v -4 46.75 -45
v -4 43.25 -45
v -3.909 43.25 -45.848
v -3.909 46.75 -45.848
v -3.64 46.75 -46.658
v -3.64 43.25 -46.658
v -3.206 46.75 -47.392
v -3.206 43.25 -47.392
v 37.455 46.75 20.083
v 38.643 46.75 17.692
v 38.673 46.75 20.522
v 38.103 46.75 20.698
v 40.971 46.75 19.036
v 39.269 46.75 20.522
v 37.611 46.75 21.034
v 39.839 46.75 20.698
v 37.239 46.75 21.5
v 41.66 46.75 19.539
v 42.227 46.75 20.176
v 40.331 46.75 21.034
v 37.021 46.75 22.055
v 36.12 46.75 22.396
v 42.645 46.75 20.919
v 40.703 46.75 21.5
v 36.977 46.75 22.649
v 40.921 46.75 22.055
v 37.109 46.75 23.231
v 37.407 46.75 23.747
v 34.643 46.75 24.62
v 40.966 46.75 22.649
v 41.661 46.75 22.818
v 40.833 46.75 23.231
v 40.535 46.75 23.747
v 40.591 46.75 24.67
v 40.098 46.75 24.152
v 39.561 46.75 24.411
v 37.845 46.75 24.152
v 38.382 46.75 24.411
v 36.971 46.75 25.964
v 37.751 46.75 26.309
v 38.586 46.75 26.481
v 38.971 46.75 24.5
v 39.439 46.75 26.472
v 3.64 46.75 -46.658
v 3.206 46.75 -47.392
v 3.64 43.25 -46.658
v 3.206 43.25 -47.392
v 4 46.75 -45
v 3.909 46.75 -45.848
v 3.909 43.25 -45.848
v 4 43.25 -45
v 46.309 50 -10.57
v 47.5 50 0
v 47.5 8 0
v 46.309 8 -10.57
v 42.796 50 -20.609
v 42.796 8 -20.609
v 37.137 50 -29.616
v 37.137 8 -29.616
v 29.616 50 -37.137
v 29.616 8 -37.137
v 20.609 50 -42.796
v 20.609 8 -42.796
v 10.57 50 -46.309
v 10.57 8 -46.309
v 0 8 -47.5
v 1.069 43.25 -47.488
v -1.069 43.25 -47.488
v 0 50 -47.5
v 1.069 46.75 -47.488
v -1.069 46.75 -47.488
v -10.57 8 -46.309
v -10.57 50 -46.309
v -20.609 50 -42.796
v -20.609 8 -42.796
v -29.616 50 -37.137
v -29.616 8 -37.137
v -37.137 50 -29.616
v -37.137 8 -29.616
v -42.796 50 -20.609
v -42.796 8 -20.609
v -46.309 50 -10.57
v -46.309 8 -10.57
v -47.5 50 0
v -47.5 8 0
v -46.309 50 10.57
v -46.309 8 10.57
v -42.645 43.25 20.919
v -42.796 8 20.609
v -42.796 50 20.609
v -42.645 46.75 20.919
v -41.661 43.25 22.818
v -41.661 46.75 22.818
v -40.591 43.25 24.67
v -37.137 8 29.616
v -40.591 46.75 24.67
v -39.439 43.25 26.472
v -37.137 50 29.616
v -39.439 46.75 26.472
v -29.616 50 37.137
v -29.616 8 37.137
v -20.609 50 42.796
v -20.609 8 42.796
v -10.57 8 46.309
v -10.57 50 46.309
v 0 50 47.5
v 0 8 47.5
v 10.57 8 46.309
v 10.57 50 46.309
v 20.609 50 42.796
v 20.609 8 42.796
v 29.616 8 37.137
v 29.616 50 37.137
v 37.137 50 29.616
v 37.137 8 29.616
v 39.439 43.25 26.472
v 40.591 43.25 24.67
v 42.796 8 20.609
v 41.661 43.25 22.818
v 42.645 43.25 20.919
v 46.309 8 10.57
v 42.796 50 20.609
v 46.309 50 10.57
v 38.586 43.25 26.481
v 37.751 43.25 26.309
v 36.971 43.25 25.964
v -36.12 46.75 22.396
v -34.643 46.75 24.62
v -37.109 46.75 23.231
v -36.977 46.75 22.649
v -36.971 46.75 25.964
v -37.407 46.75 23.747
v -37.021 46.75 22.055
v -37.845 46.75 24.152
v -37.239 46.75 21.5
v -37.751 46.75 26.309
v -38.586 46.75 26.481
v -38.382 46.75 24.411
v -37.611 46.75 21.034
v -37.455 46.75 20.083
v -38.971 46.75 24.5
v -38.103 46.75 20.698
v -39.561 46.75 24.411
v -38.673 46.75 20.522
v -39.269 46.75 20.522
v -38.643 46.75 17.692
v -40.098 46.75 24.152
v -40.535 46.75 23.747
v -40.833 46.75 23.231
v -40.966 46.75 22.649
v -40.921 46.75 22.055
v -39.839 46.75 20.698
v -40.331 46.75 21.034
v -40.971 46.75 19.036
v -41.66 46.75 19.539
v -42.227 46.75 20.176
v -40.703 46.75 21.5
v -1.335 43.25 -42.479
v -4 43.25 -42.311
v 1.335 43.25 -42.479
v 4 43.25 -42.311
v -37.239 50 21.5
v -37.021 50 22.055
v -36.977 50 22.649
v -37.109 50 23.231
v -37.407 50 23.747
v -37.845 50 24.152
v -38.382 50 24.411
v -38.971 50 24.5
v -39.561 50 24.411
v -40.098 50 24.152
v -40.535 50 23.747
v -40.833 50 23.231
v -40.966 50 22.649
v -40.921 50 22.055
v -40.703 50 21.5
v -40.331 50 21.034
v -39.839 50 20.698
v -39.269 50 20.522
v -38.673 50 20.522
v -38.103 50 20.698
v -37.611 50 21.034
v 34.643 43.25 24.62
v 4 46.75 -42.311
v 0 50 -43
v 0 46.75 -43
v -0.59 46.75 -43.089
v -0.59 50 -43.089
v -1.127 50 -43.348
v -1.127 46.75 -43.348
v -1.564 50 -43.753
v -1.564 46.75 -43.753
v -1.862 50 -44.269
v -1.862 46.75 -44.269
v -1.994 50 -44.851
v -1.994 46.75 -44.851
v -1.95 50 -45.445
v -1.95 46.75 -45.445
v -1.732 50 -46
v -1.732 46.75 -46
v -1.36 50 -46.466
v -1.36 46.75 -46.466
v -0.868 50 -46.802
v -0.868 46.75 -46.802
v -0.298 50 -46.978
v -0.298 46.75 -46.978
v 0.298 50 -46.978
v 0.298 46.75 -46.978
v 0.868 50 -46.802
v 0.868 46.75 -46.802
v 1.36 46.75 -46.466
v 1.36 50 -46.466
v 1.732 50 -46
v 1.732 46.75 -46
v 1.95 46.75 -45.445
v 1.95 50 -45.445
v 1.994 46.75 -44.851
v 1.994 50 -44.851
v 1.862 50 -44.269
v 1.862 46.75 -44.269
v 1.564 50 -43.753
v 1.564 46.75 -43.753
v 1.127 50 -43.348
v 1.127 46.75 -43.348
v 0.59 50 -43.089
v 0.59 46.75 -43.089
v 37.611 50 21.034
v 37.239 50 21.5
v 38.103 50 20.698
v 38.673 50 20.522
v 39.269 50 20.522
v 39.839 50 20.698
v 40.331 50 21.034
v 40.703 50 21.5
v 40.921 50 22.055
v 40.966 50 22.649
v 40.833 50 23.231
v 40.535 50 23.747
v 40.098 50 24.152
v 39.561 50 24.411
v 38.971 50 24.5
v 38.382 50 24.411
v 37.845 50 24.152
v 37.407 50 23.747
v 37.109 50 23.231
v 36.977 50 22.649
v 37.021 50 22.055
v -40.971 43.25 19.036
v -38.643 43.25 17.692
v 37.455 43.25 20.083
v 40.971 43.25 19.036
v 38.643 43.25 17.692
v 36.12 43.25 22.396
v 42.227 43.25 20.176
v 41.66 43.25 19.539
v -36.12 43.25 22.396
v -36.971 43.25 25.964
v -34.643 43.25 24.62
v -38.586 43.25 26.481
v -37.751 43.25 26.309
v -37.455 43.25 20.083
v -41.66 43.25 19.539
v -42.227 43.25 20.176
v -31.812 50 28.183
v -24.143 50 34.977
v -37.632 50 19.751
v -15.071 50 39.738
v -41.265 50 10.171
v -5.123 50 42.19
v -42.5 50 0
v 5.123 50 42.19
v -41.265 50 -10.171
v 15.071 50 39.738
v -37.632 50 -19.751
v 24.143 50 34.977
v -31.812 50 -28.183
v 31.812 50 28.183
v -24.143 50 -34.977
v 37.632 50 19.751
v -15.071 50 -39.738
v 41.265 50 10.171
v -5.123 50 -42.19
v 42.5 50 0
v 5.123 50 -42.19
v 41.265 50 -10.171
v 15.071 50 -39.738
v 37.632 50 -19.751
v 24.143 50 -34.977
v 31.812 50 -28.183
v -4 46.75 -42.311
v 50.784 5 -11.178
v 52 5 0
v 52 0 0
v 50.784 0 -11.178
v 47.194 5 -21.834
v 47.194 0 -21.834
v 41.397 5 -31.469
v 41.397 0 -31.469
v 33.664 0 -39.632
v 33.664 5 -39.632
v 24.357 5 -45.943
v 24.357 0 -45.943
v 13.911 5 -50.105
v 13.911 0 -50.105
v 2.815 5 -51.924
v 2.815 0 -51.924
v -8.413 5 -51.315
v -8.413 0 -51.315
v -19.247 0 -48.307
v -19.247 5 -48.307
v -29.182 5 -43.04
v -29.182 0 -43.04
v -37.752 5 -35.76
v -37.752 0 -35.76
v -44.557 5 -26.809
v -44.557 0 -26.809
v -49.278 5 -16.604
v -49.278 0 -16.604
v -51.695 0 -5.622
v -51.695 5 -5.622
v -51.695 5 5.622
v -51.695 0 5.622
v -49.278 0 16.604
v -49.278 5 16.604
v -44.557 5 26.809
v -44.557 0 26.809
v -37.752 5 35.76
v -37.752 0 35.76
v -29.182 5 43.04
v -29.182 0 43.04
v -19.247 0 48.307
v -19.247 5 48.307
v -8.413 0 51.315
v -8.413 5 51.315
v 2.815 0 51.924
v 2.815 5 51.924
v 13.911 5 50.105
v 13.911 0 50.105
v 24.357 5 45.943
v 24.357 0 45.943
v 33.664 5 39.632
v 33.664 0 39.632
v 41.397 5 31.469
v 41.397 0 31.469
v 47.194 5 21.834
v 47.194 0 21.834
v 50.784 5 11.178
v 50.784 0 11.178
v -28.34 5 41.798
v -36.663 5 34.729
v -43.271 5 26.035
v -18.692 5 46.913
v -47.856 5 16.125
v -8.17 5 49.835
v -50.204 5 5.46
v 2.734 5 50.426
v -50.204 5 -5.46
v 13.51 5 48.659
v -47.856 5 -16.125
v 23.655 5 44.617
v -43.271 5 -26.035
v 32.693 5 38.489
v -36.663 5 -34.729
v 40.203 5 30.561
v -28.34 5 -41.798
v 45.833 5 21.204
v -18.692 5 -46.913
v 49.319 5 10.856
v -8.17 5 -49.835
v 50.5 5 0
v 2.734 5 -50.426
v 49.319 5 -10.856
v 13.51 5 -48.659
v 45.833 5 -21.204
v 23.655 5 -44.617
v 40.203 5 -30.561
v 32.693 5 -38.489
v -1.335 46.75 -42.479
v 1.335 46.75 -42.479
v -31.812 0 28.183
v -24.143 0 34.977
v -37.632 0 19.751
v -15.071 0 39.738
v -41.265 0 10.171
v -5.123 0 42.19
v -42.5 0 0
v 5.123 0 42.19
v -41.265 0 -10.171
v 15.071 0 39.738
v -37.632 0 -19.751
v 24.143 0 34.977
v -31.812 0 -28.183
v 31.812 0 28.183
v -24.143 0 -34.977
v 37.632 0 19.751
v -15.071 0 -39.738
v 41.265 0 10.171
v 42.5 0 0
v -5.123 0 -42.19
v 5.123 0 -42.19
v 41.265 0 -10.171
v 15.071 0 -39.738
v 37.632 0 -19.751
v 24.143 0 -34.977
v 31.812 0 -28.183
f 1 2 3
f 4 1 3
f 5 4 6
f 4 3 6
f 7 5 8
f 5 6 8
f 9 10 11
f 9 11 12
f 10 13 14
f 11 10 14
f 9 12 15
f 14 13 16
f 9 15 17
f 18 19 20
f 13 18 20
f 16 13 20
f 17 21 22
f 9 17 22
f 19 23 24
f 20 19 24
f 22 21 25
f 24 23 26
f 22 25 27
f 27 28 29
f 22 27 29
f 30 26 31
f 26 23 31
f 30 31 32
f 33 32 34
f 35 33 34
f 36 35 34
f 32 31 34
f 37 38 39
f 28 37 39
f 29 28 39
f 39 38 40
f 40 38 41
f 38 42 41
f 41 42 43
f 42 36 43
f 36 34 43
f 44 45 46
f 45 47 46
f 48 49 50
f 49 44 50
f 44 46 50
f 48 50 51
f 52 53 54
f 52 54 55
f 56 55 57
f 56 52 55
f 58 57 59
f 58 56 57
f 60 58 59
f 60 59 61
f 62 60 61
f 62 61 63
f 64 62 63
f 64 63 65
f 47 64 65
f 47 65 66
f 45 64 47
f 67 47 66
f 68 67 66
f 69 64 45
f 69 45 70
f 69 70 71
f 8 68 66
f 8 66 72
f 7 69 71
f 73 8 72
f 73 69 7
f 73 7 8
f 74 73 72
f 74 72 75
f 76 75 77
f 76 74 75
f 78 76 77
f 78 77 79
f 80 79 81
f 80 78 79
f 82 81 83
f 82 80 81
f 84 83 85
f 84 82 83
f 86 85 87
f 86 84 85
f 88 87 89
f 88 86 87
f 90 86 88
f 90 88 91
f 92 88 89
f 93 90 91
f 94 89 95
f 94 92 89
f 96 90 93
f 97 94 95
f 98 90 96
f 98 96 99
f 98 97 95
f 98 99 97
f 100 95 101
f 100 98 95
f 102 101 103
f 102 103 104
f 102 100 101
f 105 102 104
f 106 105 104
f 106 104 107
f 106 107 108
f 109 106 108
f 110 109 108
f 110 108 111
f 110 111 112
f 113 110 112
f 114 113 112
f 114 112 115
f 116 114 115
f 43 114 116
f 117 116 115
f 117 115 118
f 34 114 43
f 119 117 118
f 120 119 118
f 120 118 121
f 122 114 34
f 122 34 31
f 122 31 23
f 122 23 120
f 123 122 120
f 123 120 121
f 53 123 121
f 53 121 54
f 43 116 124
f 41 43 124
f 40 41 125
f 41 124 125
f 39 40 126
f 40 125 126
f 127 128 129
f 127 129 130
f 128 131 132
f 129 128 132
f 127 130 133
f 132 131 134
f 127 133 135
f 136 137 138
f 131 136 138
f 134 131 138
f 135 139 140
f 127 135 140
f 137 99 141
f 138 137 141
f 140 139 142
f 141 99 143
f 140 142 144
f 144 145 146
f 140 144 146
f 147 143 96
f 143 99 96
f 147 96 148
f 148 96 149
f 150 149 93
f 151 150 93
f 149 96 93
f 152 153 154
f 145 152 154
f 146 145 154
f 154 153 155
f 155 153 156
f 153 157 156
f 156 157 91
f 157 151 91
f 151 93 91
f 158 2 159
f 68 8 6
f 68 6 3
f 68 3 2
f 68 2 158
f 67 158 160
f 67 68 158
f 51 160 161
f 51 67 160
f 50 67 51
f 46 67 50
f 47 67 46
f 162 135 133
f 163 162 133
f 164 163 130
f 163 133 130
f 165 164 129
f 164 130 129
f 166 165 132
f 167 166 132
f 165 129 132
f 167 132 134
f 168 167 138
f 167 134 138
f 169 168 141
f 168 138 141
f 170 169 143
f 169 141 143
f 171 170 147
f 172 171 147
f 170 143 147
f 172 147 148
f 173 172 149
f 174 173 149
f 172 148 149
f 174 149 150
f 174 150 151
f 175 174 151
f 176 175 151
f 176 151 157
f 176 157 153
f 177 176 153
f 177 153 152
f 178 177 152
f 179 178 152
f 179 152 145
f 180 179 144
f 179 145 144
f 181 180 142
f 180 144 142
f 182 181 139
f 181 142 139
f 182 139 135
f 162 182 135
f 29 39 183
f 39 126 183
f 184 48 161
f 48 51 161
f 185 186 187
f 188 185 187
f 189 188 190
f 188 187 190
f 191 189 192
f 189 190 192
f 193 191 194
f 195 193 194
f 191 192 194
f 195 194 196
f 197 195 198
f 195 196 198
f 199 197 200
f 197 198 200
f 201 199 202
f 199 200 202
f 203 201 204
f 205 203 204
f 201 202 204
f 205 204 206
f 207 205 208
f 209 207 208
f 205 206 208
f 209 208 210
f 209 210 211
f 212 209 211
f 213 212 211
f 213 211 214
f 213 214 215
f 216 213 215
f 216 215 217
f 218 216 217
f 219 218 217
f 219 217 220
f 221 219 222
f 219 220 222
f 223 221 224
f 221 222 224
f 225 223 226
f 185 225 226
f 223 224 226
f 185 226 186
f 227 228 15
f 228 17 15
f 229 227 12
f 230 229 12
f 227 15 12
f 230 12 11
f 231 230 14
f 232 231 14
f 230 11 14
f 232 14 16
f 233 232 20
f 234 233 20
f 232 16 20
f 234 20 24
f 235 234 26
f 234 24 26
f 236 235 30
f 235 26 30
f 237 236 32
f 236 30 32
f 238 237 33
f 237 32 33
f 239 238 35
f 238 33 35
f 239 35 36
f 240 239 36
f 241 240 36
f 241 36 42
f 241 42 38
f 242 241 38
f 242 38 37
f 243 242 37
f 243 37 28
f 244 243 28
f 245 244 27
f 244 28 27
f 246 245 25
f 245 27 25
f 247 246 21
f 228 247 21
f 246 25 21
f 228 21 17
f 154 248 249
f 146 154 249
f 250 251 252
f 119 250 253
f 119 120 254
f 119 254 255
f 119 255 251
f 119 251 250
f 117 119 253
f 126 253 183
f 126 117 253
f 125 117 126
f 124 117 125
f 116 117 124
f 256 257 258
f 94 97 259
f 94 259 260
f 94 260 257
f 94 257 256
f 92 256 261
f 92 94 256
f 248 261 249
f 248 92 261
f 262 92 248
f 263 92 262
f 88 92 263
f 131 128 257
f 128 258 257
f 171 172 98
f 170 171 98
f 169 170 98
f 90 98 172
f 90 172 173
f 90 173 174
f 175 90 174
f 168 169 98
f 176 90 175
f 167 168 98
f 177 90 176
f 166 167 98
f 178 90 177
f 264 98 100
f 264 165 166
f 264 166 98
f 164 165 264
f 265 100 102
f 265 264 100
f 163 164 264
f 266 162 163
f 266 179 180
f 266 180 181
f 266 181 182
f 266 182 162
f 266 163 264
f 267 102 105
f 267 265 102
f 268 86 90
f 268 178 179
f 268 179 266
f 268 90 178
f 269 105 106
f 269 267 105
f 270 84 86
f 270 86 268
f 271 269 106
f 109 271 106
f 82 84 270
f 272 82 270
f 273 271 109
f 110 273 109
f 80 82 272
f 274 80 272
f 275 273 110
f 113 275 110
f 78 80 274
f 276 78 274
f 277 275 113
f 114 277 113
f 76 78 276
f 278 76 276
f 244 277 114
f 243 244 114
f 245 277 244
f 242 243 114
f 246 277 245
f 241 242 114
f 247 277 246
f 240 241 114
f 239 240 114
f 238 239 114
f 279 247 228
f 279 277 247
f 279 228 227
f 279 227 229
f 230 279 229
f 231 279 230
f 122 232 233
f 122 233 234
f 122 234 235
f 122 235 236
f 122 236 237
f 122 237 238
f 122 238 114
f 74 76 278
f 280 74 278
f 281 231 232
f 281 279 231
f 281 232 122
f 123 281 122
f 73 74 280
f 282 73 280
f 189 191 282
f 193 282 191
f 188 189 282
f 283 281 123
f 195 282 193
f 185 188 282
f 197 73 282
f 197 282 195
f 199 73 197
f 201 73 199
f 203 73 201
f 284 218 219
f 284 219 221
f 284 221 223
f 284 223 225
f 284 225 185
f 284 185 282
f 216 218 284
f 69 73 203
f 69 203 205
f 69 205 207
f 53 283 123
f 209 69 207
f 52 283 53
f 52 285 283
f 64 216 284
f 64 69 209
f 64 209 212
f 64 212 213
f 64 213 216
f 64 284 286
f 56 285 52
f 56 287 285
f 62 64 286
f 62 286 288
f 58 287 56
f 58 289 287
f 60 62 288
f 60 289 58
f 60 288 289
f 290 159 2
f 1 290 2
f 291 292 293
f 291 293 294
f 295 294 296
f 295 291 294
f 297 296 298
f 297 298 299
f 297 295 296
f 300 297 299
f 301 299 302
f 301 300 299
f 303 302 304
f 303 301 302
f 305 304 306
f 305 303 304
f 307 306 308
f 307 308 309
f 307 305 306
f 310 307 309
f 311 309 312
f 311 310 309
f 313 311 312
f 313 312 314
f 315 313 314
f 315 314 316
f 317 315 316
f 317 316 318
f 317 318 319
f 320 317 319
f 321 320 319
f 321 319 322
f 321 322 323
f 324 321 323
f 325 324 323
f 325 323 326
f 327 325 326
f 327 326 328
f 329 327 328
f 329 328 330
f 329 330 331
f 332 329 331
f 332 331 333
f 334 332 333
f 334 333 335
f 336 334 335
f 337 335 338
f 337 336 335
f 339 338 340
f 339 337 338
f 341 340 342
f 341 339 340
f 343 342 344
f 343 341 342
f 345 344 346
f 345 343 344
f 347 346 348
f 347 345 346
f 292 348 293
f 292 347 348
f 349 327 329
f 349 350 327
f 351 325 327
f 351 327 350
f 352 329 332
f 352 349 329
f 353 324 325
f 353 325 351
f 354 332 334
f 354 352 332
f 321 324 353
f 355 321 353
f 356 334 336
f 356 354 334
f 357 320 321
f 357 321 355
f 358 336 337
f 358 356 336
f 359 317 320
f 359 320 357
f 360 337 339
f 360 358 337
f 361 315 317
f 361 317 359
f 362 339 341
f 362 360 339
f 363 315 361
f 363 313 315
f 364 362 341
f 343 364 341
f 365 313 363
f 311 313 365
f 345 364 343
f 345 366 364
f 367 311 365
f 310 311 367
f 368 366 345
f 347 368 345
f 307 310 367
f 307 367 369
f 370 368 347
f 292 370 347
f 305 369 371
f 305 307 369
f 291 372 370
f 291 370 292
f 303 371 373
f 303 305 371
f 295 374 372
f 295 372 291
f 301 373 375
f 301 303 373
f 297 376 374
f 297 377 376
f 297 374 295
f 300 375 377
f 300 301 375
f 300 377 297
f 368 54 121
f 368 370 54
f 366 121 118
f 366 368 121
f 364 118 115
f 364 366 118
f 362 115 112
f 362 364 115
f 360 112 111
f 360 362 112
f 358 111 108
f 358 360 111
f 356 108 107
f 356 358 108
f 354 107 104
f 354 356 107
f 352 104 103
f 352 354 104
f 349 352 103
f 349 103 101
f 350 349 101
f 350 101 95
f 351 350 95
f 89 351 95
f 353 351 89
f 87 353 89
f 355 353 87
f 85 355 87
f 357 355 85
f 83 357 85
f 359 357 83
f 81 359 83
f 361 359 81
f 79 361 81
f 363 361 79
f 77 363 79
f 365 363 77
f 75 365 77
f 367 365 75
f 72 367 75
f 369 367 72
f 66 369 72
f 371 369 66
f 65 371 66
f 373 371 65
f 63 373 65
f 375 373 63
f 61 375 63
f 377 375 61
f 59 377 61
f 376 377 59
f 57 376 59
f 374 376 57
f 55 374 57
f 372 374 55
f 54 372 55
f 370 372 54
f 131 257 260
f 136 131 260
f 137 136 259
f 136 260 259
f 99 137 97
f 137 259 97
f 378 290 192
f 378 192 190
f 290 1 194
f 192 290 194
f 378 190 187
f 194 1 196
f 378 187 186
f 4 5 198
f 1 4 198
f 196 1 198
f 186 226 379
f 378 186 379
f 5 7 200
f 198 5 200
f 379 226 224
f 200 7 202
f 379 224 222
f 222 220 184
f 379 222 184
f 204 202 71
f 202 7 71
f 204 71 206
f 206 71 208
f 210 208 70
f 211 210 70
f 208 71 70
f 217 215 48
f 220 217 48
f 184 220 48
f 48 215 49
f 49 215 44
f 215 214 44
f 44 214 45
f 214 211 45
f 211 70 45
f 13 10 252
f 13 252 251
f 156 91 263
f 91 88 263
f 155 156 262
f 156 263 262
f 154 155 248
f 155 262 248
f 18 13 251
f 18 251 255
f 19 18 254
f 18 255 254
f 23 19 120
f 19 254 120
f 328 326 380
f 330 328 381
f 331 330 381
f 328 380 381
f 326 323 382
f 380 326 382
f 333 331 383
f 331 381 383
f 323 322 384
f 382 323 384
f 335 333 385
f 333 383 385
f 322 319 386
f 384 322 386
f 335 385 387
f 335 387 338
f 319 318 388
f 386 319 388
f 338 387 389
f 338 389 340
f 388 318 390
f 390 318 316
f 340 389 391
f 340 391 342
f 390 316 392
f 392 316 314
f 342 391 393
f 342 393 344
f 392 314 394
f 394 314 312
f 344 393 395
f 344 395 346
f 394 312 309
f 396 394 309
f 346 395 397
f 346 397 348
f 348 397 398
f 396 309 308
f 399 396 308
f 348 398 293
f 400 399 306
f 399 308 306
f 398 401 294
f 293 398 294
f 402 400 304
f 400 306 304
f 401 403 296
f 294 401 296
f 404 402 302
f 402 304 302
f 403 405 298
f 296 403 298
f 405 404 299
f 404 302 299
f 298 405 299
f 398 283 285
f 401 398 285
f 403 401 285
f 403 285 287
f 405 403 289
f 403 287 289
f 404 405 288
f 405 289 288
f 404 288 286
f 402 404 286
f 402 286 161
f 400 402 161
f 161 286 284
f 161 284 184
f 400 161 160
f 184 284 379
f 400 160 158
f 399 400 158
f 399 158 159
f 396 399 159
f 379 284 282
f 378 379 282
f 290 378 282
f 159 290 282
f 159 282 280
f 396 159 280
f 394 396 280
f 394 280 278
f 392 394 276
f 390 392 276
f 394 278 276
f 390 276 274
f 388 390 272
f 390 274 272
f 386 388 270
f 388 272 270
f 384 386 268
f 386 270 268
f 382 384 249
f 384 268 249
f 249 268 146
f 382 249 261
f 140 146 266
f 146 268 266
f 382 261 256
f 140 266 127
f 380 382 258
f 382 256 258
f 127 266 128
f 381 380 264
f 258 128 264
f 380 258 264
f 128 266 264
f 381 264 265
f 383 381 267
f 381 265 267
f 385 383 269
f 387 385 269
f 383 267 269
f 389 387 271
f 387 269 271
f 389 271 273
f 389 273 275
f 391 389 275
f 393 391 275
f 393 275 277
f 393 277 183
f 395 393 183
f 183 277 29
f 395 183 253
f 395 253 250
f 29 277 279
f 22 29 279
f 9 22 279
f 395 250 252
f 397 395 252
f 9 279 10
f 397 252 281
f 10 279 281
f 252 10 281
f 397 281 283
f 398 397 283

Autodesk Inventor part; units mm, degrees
ref_plane "YZ Plane" through (0, 0, 0) normal (1, 0, 0) x (0, 1, 0)
ref_plane "XZ Plane" through (0, 0, 0) normal (0, 1, 0) x (-1, 0, 0)
sketch "Sketch1" plane through (0, 0, 0) normal (0, 0, 1) x (1, 0, 0)
  line L0 (42.5, 0) -> (42.5, 50)
  line L1 (0, -10) -> (0, 60) projected
  line L2 (42.5, 0) -> (52, 0)
  line L3 (52, 0) -> (52, 5)
  line L4 (52, 5) -> (50.5, 5)
  line L5 (47.5, 8) -> (47.5, 50)
  line L6 (-10.4, 0) -> (62.4, 0) projected
  line L7 (50.5, 5) -> (47.5, 8)
  line L8 (42.5, 50) -> (47.5, 50)
  point P0 (0, 0)
  point P1 (47.5, 5)
  point P2 (45, 50)
  dimension "d1" = 5
  dimension "d6" = 3
  dimension "d7" = 3
  dimension "d8" = 50
  dimension "d30" = 9.5
  dimension "d31" = 45
  dimension "d32" = 5
revolve "Revolution1" add sketch "Sketch1" angle 360 about axis through (0, -10, 0) along (0, 1, 0)
ref_plane "Work Plane1" through (0, 45, 0) normal (0, 1, 0) x (1, 0, 0)
sketch "Sketch2" plane through (0, 45, 0) normal (0, 1, 0) x (1, 0, 0)
  arc A0 (-3.996, 44.8222) -> (3.996, 44.8222) centre (0, 0) ccw
  arc A1 (3.996, 44.8222) -> (-3.996, 44.8222) centre (0, 45) ccw
  circle A2 centre (0, 0) radius 42.5 projected
  line L0 (4, 45) -> (4, 41.0512)
  line L1 (4, 41.0512) -> (-4, 41.0512)
  line L2 (-4, 41.0512) -> (-4, 45)
  point P0 (0, 44.7796)
  point P1 (-4, 44.8219)
  point P2 (-4, 42.3113)
  point P3 (4, 42.3113)
  point P4 (4, 44.8219)
  dimension "d11" = 90
  dimension "d12" = 8
extrude "Nut Seat" cut sketch "Sketch2" along normal mid plane 3.5 contours A1 A0 L0 A2 L2 | A0 L2 A1 | A0 A1 L0 | L2 L1 L0 A2 | A2 L0 L1 L2
sketch "Sketch3" plane through (0, 50, 0) normal (0, 1, 0) x (1, 0, 0)
  line L0 (0, 72.8) -> (0, -72.8) projected
  point P0 (0, 0)
  point P1 (0, 45)
  dimension "d26" = 45
hole "Hole1" at (0, 50, -45) direction (0, -1, 0) diameter 4 depth 6.75
pattern_circular "Circular Pattern1" count 3 over 360 about axis through (0, -10, 0) along (0, 1, 0) of "Hole1"
pattern_circular "Circular Pattern2" count 3 over 360 about axis through (0, 25, 0) along (0, 1, 0) of "Nut Seat"
equation "\"d7\" = d6"
properties part number "Center Cylinder"
